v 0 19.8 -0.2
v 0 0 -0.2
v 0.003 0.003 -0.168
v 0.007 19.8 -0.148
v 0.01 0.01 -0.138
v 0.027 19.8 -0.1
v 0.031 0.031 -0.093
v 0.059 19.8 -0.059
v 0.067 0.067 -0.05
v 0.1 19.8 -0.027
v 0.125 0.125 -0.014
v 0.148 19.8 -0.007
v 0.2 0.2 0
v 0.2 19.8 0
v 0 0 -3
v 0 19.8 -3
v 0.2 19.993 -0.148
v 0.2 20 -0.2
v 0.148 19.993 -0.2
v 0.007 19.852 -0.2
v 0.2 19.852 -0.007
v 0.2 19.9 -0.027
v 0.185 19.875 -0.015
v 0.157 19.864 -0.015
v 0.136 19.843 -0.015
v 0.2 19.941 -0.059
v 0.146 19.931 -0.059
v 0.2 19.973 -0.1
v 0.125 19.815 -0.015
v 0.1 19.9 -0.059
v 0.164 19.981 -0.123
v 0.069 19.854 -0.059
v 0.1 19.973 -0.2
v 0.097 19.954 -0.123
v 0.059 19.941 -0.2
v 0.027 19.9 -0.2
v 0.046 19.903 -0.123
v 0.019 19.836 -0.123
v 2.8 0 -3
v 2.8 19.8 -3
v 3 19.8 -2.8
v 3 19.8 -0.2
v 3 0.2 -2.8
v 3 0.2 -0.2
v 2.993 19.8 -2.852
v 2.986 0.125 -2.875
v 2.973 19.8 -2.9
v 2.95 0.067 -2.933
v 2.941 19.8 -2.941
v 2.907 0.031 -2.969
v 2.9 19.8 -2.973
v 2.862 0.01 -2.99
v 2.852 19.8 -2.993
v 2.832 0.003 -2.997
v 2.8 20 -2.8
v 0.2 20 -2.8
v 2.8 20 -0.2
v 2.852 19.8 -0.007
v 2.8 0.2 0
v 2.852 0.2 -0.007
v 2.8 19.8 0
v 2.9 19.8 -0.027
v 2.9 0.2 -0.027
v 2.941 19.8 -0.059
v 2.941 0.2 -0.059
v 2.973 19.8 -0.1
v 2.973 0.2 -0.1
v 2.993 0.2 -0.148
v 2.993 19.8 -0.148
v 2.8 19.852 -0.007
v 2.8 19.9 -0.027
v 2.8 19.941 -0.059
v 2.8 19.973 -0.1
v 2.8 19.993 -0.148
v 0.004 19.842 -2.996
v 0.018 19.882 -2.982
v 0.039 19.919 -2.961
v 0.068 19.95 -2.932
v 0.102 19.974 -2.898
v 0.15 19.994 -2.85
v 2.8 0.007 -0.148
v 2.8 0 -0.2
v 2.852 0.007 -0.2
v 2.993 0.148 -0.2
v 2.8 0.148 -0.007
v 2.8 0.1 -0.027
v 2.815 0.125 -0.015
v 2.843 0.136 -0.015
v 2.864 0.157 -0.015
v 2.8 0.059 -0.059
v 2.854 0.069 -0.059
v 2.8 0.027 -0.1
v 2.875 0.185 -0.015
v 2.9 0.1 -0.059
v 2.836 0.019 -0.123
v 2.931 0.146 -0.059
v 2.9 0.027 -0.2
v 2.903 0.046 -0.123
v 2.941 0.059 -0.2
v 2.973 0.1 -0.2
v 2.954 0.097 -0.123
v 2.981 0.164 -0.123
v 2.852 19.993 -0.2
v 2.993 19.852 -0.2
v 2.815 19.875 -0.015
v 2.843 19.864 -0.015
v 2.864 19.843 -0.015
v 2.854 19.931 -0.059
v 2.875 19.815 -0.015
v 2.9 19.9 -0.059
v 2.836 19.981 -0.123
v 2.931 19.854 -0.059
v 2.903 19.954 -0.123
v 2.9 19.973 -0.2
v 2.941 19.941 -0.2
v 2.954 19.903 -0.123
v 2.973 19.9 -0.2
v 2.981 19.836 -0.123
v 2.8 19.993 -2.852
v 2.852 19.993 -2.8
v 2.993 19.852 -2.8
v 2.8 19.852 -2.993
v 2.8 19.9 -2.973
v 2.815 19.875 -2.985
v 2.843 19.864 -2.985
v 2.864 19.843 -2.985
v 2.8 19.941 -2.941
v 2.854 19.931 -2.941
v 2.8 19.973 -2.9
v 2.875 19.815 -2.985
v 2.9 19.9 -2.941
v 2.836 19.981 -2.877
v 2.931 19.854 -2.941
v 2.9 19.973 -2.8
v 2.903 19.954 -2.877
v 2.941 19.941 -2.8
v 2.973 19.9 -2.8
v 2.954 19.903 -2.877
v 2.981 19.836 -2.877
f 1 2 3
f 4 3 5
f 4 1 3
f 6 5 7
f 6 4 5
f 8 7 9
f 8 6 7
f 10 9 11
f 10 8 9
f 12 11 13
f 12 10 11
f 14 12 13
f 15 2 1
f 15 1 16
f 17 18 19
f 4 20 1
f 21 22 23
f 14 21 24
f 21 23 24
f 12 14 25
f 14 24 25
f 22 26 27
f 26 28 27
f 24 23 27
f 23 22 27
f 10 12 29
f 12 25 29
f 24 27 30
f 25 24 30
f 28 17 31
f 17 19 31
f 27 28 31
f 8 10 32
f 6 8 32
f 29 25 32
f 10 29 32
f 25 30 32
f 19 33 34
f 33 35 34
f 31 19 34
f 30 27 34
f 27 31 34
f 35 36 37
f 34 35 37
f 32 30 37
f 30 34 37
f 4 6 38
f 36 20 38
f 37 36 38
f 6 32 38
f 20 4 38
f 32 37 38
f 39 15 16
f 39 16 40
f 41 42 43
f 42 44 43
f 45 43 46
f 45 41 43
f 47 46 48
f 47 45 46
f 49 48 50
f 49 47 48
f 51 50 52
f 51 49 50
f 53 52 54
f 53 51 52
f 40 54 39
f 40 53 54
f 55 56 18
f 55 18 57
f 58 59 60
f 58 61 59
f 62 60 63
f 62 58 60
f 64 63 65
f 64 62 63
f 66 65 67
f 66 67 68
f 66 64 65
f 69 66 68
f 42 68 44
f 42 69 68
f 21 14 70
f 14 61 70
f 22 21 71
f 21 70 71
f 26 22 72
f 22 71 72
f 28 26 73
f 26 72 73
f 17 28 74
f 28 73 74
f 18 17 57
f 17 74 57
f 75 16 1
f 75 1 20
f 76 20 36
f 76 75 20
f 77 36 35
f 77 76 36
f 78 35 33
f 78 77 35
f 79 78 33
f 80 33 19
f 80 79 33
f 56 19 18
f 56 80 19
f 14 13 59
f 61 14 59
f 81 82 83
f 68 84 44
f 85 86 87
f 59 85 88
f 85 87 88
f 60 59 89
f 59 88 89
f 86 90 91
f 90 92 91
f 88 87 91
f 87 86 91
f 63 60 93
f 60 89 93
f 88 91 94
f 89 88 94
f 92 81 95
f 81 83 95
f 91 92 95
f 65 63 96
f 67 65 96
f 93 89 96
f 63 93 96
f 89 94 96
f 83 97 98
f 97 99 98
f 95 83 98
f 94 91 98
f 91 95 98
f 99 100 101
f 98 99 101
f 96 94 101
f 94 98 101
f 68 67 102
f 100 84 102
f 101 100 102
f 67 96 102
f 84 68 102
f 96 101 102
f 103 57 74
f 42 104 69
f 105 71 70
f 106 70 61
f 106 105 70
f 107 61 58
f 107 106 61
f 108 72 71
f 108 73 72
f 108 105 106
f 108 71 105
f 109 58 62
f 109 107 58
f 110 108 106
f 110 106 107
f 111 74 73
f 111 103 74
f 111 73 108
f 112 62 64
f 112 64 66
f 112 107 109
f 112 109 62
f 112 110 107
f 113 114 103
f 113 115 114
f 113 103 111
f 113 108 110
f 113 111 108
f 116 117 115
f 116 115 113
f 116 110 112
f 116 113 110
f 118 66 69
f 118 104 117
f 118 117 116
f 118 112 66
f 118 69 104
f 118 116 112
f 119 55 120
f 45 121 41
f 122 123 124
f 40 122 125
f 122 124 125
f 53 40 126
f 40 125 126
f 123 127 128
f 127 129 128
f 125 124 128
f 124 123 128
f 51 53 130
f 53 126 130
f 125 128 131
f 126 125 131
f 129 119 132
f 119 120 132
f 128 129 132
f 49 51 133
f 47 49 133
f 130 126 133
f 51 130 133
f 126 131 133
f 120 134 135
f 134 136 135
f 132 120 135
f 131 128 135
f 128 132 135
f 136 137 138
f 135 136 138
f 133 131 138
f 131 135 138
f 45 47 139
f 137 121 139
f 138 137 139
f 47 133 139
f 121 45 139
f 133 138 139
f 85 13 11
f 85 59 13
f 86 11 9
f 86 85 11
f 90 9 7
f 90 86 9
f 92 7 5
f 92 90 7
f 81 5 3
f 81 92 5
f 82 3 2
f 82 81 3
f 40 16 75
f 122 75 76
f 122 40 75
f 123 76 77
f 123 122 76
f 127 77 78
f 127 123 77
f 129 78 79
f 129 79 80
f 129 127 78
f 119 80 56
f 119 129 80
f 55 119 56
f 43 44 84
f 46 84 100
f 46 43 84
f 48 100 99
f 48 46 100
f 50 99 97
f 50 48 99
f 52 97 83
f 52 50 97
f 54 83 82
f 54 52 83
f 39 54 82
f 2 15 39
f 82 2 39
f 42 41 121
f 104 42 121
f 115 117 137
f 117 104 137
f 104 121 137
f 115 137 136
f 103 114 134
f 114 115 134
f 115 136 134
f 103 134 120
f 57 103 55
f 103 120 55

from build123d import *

# Parameters (mm, degrees)
SKETCH1_W           = 3
SKETCH1_H           = 3
BOSS_EXTRUDE1_DEPTH = 20
FILLET1_R           = 0.2


with BuildPart() as part:
    # Sketch1 → Boss-Extrude1 (new body)
    with BuildSketch(Plane(origin=(0, 0, 0), x_dir=(1, 0, 0), z_dir=(0, 1, 0))):
        with Locations((1.5, 1.5)):
            Rectangle(SKETCH1_W, SKETCH1_H)
    extrude(amount=BOSS_EXTRUDE1_DEPTH)

    # Fillet1
    fillet1_edges = [part.edges().sort_by_distance(p)[0] for p in [
        (3, 20, -1.5),
        (1.5, 20, -3),
        (0, 20, -1.5),
        (3, 0, -1.5),
        (1.5, 0, 0),
        (1.5, 20, 0),
        (3, 10, -3),
        (3, 10, 0),
        (0, 10, 0),
    ]]
    fillet(fillet1_edges, radius=FILLET1_R)


solid = part.part
